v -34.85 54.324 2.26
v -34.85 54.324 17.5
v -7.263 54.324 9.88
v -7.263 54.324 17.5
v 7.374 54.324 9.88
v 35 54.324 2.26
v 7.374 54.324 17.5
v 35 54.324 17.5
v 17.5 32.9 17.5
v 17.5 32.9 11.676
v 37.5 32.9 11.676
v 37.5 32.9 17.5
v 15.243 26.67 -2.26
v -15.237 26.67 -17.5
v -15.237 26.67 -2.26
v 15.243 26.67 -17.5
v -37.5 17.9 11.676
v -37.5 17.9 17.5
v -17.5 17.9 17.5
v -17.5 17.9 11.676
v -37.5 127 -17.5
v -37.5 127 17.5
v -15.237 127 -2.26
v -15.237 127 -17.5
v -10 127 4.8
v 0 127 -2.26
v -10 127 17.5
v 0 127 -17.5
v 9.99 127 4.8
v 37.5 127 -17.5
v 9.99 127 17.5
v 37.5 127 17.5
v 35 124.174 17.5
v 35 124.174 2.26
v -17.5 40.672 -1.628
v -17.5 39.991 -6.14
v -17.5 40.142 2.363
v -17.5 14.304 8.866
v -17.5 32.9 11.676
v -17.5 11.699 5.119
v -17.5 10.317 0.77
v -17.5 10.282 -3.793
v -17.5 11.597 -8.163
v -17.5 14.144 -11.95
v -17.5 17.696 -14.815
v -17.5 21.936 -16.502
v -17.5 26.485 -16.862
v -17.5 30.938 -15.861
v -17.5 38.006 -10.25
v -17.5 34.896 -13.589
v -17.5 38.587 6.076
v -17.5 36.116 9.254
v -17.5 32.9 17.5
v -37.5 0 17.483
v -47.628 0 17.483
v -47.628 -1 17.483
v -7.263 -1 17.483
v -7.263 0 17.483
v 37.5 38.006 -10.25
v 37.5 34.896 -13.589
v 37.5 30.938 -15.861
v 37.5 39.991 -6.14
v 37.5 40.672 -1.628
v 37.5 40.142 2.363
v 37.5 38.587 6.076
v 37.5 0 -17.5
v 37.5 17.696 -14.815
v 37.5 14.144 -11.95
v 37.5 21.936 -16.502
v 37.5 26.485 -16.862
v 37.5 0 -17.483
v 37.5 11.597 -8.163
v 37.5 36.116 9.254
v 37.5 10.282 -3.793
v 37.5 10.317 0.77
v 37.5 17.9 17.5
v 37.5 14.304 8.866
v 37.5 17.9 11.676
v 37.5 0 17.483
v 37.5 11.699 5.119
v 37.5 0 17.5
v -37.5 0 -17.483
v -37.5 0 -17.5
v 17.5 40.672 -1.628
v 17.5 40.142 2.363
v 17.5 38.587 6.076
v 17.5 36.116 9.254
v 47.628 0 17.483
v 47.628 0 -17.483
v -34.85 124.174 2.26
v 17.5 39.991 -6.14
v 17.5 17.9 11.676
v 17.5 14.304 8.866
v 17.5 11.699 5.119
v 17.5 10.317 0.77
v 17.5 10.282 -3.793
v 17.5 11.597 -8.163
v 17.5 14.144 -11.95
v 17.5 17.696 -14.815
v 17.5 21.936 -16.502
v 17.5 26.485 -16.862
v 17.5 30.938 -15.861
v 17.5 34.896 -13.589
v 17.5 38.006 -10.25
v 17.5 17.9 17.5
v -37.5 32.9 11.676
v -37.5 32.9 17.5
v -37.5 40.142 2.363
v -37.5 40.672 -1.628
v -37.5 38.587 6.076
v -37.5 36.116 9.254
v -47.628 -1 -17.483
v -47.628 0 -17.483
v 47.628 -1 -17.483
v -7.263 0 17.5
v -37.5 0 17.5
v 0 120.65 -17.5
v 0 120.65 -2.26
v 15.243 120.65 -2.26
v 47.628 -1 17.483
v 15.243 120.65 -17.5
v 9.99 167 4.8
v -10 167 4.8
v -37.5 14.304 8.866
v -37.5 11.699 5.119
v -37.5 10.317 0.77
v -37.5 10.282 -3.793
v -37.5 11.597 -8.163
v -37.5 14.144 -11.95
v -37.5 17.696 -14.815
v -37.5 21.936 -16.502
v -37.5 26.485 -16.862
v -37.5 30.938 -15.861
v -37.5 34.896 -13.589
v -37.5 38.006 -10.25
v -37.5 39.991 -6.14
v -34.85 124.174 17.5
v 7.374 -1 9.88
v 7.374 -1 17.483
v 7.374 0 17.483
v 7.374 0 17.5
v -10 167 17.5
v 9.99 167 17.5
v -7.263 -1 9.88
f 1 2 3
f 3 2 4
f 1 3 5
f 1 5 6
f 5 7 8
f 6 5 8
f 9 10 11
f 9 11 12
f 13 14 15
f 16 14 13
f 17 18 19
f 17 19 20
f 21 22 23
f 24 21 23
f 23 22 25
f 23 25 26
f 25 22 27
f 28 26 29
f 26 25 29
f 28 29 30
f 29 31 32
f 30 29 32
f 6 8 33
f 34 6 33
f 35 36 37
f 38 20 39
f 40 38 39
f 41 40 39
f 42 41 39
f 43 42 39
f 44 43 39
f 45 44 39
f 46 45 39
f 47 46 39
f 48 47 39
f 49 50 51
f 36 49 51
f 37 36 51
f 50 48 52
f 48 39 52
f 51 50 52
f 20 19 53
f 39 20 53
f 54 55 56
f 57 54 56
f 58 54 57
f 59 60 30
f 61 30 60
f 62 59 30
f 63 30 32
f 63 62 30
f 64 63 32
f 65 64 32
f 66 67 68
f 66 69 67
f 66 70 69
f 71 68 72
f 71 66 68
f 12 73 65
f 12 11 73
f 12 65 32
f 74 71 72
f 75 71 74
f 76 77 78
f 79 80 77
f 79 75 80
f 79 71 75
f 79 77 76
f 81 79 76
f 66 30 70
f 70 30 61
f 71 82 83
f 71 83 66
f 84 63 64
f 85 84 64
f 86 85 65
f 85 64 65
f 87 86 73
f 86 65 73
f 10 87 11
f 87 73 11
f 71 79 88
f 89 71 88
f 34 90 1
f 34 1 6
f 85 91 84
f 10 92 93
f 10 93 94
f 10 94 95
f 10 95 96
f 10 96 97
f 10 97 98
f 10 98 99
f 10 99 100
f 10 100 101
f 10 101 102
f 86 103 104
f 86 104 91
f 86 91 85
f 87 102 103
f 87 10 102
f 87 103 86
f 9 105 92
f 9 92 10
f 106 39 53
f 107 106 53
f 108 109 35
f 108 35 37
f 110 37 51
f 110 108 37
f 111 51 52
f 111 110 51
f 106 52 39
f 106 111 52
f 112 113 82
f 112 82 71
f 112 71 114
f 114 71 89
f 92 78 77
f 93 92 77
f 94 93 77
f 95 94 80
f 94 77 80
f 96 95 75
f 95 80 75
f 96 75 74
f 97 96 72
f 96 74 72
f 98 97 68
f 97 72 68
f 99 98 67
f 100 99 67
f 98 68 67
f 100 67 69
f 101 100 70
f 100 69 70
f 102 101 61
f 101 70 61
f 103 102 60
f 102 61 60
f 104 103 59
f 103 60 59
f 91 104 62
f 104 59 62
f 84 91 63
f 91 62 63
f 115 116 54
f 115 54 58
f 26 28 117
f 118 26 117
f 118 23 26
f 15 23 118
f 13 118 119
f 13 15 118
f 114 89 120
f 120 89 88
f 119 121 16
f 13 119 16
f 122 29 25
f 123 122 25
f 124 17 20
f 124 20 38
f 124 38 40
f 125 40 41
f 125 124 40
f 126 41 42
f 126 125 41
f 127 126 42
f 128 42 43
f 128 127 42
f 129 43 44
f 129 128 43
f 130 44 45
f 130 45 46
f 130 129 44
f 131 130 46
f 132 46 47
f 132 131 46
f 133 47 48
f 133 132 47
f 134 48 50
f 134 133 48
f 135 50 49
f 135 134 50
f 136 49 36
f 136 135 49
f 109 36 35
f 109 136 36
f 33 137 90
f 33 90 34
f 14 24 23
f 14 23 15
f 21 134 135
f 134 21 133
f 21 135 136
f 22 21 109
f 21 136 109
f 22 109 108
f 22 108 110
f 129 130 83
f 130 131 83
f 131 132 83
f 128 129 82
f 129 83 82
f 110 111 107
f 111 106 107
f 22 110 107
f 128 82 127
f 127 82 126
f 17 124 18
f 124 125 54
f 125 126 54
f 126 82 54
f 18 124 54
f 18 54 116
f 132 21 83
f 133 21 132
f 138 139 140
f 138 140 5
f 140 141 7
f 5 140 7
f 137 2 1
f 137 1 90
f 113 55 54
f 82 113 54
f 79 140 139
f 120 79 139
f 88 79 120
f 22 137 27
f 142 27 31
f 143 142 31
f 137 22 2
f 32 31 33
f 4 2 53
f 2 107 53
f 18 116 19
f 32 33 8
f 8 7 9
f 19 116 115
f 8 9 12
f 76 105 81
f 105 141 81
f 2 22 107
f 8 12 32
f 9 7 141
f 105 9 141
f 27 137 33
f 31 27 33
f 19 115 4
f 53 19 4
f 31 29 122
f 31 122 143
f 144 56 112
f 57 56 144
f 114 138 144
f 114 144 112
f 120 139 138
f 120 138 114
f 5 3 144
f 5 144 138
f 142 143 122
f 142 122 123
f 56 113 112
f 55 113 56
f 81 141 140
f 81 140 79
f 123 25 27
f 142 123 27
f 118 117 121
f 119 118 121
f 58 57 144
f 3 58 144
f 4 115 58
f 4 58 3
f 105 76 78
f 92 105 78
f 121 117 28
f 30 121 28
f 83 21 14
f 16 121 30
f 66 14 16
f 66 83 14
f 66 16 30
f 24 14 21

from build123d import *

# Parameters (mm, degrees)
F0_W      = 75
F0_H      = 35
F1_DEPTH  = 127
F3_DEPTH  = 20
F5_W      = 19.9898
F5_H      = 12.7
F6_DEPTH  = 40
F7_W      = 69.85
F7_H      = 69.85
F8_DEPTH  = 15.24
F9_W      = 95.2556729317
F9_H      = 34.9658876657
F10_DEPTH = 1
F11_W     = 14.6372080781
F11_H     = 57.15
F12_DEPTH = 7.62
F13_W     = 30.48
F13_H     = 93.98
F14_DEPTH = 15.24
F15_W     = 15.2369
F15_H     = 6.35
F16_DEPTH = 15.24


# Not quite as in the source:
# - a feature names something its author has since deleted; it is built from what else it names


with BuildPart() as f1:
    # F0 (on Front) → F1 (new body)
    with BuildSketch(Plane.XZ):
        Rectangle(F0_W, F0_H)
    extrude(amount=-F1_DEPTH)

    # F2 (on face) → F3 (cut)
    with BuildSketch(Plane.YZ.offset(37.5)):
        with BuildLine():
            ThreePointArc((17.9, 11.676062799), (25.4, 13.6444626123), (32.9, 11.676062799))
            Line((32.9, 11.676062799), (32.9, 17.5))
            Line((32.9, 17.5), (17.9, 17.5))
            Line((17.9, 17.5), (17.9, 11.676062799))
        make_face()
        with BuildLine():
            Line((32.9, 9.7889252245), (32.9, 11.676062799))
            ThreePointArc((32.9, 11.676062799), (25.4, 13.6444626123), (17.9, 11.676062799))
            Line((17.9, 11.676062799), (17.9, 9.7889252245))
            Line((17.9, 9.7889252245), (32.9, 9.7889252245))
        make_face()
        with BuildLine():
            ThreePointArc((17.9, 11.676062799), (17.6959593413, -14.8149434406), (40.672455682, -1.6279930697))
            ThreePointArc((40.672455682, -1.6279930697), (38.586950371, 6.076047589), (32.9, 11.676062799))
            Line((32.9, 11.676062799), (32.9, 9.7889252245))
            Line((32.9, 9.7889252245), (17.9, 9.7889252245))
            Line((17.9, 9.7889252245), (17.9, 11.676062799))
        make_face()
    extrude(amount=-F3_DEPTH, mode=Mode.SUBTRACT)

    # F4: F1 across plane


with BuildPart() as f1_1:
    add(f1.part)
    add(f1.part.mirror(Plane.YZ), mode=Mode.INTERSECT)

    # F5 (on face) → F6 (join)
    with BuildSketch(Plane(origin=(0, 127, 0), x_dir=(-1, 0, 0), z_dir=(0, 1, 0))):
        with Locations((0.0051, 11.15)):
            Rectangle(F5_W, F5_H)
    extrude(amount=F6_DEPTH)

    # F7 (on face) → F8 (cut)
    with BuildSketch(Plane.XY.offset(17.5)):
        with Locations((0.075, 89.2494911432)):
            Rectangle(F7_W, F7_H)
    extrude(amount=-F8_DEPTH, mode=Mode.SUBTRACT)

    # F9 (on Front) → F10 (join)
    with BuildSketch(Plane.XZ):
        Rectangle(F9_W, F9_H)
    extrude(amount=F10_DEPTH)

    # F11 (on face) → F12 (cut)
    with BuildSketch(Plane.XY.offset(17.5)):
        with Locations((0.0553701539, 27.575)):
            Rectangle(F11_W, F11_H)
    extrude(amount=-F12_DEPTH, mode=Mode.SUBTRACT)

    # F13 (on face) → F14 (cut)
    with BuildSketch(Plane(origin=(0, 0, -17.5), x_dir=(1, 0, 0), z_dir=(0, 0, -1))):
        with Locations((0.0031, -73.66)):
            Rectangle(F13_W, F13_H)
    extrude(amount=-F14_DEPTH, mode=Mode.SUBTRACT)

    # F15 (on face) → F16 (cut)
    with BuildSketch(Plane(origin=(0, 0, -17.5), x_dir=(1, 0, 0), z_dir=(0, 0, -1))):
        with Locations((-7.61845, -123.825)):
            Rectangle(F15_W, F15_H)
    extrude(amount=-F16_DEPTH, mode=Mode.SUBTRACT)


solid = f1_1.part
